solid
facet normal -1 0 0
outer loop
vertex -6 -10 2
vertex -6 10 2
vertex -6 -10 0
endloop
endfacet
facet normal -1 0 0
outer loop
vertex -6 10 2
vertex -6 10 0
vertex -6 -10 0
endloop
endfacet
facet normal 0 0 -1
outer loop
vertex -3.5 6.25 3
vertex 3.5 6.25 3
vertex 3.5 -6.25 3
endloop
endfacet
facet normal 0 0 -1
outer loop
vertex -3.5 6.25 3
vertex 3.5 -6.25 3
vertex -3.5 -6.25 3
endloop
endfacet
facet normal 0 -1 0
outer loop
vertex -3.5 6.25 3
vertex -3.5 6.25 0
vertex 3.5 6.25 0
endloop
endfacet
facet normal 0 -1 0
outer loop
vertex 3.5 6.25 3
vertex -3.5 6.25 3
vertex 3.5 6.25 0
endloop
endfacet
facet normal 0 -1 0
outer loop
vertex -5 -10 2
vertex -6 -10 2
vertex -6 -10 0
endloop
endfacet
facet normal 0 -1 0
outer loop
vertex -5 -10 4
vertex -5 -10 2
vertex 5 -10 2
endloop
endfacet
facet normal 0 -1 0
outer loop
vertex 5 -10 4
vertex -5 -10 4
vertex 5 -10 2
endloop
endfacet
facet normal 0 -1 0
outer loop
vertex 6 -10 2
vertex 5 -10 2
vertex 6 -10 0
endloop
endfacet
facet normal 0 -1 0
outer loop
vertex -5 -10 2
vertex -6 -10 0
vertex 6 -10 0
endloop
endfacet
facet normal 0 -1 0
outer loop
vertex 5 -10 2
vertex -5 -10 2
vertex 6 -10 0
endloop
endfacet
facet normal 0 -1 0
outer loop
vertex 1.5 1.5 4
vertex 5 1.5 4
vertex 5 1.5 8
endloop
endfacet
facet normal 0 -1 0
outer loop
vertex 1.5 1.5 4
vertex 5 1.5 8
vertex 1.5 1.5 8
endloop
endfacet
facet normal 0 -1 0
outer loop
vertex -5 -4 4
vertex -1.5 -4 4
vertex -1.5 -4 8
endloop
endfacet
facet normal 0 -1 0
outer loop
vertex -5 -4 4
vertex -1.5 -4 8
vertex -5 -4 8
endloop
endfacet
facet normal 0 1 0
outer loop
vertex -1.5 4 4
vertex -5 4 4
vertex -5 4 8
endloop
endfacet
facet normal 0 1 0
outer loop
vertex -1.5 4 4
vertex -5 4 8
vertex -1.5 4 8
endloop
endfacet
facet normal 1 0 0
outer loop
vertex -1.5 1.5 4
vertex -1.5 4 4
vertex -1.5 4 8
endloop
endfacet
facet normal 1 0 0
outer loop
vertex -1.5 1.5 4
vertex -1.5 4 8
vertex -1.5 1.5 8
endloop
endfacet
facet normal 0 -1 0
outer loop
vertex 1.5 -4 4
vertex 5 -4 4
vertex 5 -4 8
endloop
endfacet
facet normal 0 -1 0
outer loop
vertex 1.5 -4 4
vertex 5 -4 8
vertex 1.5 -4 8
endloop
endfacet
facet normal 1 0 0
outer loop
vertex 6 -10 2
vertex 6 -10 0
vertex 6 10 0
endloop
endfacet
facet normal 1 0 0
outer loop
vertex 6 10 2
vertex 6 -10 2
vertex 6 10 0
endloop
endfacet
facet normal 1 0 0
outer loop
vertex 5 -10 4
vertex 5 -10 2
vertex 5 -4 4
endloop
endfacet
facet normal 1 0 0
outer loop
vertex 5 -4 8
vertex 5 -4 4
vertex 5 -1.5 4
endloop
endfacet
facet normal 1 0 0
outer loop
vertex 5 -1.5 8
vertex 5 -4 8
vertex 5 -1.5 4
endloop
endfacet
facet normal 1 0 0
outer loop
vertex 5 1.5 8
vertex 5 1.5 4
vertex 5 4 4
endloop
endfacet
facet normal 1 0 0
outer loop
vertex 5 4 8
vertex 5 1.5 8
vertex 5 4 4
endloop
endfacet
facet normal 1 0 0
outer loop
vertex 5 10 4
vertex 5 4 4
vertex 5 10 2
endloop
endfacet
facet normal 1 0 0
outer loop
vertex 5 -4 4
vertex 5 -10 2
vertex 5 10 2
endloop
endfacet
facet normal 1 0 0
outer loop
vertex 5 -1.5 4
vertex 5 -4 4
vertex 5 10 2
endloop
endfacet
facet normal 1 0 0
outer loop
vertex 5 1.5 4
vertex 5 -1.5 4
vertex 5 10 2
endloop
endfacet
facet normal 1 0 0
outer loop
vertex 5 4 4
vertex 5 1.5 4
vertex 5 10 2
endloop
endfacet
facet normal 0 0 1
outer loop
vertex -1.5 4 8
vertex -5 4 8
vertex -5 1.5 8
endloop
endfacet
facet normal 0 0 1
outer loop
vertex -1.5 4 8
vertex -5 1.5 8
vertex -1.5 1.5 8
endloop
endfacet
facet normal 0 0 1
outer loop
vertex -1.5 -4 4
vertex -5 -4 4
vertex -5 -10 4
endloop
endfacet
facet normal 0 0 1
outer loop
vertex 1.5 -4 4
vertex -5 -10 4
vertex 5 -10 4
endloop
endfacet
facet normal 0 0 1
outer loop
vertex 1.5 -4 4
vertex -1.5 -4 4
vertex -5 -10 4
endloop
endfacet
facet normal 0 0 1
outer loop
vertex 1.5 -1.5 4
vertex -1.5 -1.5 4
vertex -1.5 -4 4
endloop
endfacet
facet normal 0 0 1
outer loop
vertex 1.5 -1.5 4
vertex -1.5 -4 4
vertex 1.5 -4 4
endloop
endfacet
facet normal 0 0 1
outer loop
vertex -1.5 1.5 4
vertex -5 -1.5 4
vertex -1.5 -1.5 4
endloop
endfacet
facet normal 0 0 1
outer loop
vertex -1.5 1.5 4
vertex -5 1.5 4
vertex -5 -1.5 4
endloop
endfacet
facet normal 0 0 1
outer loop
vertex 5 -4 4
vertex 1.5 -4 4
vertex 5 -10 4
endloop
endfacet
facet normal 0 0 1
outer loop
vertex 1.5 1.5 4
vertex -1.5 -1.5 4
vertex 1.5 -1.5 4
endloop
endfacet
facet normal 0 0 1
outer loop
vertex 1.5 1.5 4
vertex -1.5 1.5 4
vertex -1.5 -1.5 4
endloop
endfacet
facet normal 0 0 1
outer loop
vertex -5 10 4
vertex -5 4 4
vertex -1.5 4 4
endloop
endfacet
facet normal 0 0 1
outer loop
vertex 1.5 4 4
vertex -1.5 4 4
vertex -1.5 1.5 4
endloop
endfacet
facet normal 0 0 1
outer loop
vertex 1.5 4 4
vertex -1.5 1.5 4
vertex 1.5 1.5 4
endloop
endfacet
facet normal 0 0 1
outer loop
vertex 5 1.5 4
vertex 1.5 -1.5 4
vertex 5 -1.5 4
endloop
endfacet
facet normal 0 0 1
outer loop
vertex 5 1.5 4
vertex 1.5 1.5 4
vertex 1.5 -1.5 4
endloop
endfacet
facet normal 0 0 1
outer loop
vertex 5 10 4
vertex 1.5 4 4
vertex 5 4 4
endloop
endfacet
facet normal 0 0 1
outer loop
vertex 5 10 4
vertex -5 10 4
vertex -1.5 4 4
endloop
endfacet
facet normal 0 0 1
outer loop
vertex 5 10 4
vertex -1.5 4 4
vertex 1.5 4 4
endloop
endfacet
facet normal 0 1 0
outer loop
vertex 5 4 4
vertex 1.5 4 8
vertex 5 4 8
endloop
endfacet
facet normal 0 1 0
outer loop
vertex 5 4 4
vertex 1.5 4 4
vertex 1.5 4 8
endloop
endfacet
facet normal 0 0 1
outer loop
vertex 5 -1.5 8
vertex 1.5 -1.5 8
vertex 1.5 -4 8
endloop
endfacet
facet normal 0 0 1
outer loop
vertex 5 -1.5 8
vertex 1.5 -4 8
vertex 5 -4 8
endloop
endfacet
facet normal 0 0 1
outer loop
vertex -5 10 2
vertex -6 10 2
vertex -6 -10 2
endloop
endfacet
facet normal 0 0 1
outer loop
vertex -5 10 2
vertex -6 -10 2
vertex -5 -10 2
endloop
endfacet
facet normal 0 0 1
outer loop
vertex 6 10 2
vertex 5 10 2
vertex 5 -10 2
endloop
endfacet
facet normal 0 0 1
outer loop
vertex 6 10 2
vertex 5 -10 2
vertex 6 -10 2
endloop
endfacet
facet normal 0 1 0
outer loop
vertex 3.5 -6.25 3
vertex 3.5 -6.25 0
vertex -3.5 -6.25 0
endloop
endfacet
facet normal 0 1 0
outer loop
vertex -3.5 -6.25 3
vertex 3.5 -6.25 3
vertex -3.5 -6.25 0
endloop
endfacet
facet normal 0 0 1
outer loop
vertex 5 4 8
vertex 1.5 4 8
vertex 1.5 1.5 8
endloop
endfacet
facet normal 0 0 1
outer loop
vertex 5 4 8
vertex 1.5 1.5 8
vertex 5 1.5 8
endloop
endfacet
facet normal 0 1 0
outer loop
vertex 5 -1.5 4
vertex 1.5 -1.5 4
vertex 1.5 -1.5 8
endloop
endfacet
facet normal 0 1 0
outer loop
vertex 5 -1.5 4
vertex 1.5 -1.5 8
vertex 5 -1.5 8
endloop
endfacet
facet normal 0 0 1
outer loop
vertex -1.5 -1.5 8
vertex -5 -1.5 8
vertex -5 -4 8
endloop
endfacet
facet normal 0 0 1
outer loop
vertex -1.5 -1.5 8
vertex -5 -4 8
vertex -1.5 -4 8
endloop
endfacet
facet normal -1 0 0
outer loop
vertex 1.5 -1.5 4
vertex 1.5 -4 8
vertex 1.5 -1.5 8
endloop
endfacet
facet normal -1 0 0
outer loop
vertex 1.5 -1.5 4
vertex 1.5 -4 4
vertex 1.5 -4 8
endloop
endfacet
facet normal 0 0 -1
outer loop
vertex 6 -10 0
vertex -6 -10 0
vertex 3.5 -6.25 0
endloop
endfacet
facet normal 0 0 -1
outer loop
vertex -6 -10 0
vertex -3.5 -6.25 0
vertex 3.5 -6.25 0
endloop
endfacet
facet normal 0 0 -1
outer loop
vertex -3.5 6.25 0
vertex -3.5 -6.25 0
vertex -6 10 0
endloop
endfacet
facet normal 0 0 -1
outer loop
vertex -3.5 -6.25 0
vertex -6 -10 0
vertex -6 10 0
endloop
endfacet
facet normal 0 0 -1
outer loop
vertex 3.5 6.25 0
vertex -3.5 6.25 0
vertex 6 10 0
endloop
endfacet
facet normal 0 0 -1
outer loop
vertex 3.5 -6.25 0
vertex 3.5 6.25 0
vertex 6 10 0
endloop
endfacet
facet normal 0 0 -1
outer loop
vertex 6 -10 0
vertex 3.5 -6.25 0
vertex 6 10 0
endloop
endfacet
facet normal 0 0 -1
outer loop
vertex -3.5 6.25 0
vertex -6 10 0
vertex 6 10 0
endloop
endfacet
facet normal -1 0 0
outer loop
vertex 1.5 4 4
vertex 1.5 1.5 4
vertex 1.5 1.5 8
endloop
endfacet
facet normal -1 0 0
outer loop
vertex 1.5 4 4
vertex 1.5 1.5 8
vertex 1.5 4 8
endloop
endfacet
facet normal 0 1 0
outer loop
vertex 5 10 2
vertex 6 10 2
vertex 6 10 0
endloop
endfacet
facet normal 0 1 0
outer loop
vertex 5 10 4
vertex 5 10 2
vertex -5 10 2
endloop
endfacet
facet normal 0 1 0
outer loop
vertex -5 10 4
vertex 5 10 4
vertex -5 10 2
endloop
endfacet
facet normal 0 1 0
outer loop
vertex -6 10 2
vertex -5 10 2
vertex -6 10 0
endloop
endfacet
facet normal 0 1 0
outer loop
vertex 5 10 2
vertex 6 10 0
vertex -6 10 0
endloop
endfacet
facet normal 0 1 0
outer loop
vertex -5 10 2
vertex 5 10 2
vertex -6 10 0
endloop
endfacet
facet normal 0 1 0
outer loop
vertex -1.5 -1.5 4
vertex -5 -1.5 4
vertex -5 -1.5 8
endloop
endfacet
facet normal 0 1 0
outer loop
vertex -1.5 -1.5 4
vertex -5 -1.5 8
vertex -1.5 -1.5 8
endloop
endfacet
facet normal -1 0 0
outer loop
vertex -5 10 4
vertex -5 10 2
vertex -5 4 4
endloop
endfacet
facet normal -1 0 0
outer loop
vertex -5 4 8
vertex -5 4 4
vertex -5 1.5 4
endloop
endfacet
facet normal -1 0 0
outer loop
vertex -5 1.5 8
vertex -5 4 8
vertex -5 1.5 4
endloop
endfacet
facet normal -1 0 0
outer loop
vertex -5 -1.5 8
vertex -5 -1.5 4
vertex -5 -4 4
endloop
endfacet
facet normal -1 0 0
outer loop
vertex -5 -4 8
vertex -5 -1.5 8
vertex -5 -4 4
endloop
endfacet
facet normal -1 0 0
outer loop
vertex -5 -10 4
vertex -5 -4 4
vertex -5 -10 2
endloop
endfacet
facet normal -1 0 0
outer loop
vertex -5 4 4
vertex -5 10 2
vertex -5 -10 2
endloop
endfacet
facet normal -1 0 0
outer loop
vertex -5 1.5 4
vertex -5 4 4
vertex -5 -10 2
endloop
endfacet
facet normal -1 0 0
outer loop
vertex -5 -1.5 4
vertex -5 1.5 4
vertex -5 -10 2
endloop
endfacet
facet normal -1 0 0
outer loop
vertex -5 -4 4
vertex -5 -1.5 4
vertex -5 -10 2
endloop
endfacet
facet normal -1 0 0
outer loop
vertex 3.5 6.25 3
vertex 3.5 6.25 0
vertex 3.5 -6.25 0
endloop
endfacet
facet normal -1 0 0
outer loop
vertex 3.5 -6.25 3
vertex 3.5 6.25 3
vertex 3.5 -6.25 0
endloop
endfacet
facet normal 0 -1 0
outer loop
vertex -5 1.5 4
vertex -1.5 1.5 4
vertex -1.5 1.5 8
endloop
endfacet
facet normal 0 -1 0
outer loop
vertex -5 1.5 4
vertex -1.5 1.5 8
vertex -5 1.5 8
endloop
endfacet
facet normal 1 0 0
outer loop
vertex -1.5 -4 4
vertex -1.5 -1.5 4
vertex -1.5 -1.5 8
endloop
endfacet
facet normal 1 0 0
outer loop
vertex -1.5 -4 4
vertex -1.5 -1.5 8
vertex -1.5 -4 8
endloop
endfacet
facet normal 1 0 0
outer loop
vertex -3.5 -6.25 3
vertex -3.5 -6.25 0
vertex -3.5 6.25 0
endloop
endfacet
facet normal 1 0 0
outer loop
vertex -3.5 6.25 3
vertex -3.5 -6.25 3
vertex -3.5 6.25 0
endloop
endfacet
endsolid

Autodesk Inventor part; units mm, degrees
ref_plane "YZ Plane" through (0, 0, 0) normal (1, 0, 0) x (0, 1, 0)
ref_plane "XZ Plane" through (0, 0, 0) normal (0, 1, 0) x (-1, 0, 0)
ref_plane "XY Plane" through (0, 0, 0) normal (0, 0, 1) x (1, 0, 0)
sketch "Sketch1" plane through (0, 0, 0) normal (0, 0, 1) x (1, 0, 0)
  line L0 (-6, -10) -> (6, -10)
  line L1 (6, -10) -> (6, 10)
  line L2 (6, 10) -> (-6, 10)
  line L3 (-6, 10) -> (-6, -10)
  line L4 (-6, -10) -> (6, 10) construction
  line L5 (6, -10) -> (-6, 10) construction
  point P0 (0, 0)
  dimension "d0" = 12
  dimension "d1" = 20
extrude "Extrusion1" add sketch "Sketch1" along normal blind 2
sketch "Sketch2" plane through (0, 0, 2) normal (0, 0, 1) x (1, 0, 0)
  line L0 (-5, -10) -> (5, -10)
  line L1 (5, -10) -> (5, 10)
  line L2 (5, 10) -> (-5, 10)
  line L3 (-5, 10) -> (-5, -10)
  line L4 (-5, -10) -> (5, 10) construction
  line L5 (5, -10) -> (-5, 10) construction
  point P0 (0, 0)
  point P1 (-6, 10)
  dimension "d4" = 10
extrude "Extrusion2" add sketch "Sketch2" along normal blind 2
sketch "Sketch3" plane through (0, 0, 4) normal (0, 0, 1) x (1, 0, 0)
  line L0 (-5, 10) -> (-5, -10) projected
  line L1 (-5, 4) -> (-1.5, 4)
  line L2 (-1.5, 4) -> (-1.5, 1.5)
  line L3 (-1.5, 1.5) -> (-5, 1.5)
  line L4 (-5, -1.5) -> (-1.5, -1.5)
  line L5 (-1.5, -1.5) -> (-1.5, -4)
  line L6 (-1.5, -4) -> (-5, -4)
  line L7 (5, 10) -> (-5, 10) projected
  line L8 (-5, -10) -> (5, -10) projected
  point P0 (0, 0)
  dimension "d7" = 6
  dimension "d8" = 2.5
  dimension "d9" = 6
  dimension "d10" = 2.5
  dimension "d11" = 1.5
extrude "Extrusion3" add sketch "Sketch3" along normal blind 4
mirror "Mirror1" about plane through (0, 0, 0) normal (1, 0, 0) of "Extrusion3"
sketch "Sketch4" plane through (0, 0, 0) normal (0, 0, -1) x (-1, 0, 0)
  line L0 (-3.5, -6.25) -> (3.5, -6.25)
  line L1 (3.5, -6.25) -> (3.5, 6.25)
  line L2 (3.5, 6.25) -> (-3.5, 6.25)
  line L3 (-3.5, 6.25) -> (-3.5, -6.25)
  line L4 (-3.5, -6.25) -> (3.5, 6.25) construction
  line L5 (3.5, -6.25) -> (-3.5, 6.25) construction
  line L6 (-6, 10) -> (6, 10) projected
  point P0 (0, 0)
  dimension "d14" = 12.5
  dimension "d15" = 3.75
  dimension "d16" = 7
extrude "Extrusion4" cut sketch "Sketch4" against normal blind 3
equation "\"d9\" = d7"
equation "\"d10\" = d8"
properties part number "18"
